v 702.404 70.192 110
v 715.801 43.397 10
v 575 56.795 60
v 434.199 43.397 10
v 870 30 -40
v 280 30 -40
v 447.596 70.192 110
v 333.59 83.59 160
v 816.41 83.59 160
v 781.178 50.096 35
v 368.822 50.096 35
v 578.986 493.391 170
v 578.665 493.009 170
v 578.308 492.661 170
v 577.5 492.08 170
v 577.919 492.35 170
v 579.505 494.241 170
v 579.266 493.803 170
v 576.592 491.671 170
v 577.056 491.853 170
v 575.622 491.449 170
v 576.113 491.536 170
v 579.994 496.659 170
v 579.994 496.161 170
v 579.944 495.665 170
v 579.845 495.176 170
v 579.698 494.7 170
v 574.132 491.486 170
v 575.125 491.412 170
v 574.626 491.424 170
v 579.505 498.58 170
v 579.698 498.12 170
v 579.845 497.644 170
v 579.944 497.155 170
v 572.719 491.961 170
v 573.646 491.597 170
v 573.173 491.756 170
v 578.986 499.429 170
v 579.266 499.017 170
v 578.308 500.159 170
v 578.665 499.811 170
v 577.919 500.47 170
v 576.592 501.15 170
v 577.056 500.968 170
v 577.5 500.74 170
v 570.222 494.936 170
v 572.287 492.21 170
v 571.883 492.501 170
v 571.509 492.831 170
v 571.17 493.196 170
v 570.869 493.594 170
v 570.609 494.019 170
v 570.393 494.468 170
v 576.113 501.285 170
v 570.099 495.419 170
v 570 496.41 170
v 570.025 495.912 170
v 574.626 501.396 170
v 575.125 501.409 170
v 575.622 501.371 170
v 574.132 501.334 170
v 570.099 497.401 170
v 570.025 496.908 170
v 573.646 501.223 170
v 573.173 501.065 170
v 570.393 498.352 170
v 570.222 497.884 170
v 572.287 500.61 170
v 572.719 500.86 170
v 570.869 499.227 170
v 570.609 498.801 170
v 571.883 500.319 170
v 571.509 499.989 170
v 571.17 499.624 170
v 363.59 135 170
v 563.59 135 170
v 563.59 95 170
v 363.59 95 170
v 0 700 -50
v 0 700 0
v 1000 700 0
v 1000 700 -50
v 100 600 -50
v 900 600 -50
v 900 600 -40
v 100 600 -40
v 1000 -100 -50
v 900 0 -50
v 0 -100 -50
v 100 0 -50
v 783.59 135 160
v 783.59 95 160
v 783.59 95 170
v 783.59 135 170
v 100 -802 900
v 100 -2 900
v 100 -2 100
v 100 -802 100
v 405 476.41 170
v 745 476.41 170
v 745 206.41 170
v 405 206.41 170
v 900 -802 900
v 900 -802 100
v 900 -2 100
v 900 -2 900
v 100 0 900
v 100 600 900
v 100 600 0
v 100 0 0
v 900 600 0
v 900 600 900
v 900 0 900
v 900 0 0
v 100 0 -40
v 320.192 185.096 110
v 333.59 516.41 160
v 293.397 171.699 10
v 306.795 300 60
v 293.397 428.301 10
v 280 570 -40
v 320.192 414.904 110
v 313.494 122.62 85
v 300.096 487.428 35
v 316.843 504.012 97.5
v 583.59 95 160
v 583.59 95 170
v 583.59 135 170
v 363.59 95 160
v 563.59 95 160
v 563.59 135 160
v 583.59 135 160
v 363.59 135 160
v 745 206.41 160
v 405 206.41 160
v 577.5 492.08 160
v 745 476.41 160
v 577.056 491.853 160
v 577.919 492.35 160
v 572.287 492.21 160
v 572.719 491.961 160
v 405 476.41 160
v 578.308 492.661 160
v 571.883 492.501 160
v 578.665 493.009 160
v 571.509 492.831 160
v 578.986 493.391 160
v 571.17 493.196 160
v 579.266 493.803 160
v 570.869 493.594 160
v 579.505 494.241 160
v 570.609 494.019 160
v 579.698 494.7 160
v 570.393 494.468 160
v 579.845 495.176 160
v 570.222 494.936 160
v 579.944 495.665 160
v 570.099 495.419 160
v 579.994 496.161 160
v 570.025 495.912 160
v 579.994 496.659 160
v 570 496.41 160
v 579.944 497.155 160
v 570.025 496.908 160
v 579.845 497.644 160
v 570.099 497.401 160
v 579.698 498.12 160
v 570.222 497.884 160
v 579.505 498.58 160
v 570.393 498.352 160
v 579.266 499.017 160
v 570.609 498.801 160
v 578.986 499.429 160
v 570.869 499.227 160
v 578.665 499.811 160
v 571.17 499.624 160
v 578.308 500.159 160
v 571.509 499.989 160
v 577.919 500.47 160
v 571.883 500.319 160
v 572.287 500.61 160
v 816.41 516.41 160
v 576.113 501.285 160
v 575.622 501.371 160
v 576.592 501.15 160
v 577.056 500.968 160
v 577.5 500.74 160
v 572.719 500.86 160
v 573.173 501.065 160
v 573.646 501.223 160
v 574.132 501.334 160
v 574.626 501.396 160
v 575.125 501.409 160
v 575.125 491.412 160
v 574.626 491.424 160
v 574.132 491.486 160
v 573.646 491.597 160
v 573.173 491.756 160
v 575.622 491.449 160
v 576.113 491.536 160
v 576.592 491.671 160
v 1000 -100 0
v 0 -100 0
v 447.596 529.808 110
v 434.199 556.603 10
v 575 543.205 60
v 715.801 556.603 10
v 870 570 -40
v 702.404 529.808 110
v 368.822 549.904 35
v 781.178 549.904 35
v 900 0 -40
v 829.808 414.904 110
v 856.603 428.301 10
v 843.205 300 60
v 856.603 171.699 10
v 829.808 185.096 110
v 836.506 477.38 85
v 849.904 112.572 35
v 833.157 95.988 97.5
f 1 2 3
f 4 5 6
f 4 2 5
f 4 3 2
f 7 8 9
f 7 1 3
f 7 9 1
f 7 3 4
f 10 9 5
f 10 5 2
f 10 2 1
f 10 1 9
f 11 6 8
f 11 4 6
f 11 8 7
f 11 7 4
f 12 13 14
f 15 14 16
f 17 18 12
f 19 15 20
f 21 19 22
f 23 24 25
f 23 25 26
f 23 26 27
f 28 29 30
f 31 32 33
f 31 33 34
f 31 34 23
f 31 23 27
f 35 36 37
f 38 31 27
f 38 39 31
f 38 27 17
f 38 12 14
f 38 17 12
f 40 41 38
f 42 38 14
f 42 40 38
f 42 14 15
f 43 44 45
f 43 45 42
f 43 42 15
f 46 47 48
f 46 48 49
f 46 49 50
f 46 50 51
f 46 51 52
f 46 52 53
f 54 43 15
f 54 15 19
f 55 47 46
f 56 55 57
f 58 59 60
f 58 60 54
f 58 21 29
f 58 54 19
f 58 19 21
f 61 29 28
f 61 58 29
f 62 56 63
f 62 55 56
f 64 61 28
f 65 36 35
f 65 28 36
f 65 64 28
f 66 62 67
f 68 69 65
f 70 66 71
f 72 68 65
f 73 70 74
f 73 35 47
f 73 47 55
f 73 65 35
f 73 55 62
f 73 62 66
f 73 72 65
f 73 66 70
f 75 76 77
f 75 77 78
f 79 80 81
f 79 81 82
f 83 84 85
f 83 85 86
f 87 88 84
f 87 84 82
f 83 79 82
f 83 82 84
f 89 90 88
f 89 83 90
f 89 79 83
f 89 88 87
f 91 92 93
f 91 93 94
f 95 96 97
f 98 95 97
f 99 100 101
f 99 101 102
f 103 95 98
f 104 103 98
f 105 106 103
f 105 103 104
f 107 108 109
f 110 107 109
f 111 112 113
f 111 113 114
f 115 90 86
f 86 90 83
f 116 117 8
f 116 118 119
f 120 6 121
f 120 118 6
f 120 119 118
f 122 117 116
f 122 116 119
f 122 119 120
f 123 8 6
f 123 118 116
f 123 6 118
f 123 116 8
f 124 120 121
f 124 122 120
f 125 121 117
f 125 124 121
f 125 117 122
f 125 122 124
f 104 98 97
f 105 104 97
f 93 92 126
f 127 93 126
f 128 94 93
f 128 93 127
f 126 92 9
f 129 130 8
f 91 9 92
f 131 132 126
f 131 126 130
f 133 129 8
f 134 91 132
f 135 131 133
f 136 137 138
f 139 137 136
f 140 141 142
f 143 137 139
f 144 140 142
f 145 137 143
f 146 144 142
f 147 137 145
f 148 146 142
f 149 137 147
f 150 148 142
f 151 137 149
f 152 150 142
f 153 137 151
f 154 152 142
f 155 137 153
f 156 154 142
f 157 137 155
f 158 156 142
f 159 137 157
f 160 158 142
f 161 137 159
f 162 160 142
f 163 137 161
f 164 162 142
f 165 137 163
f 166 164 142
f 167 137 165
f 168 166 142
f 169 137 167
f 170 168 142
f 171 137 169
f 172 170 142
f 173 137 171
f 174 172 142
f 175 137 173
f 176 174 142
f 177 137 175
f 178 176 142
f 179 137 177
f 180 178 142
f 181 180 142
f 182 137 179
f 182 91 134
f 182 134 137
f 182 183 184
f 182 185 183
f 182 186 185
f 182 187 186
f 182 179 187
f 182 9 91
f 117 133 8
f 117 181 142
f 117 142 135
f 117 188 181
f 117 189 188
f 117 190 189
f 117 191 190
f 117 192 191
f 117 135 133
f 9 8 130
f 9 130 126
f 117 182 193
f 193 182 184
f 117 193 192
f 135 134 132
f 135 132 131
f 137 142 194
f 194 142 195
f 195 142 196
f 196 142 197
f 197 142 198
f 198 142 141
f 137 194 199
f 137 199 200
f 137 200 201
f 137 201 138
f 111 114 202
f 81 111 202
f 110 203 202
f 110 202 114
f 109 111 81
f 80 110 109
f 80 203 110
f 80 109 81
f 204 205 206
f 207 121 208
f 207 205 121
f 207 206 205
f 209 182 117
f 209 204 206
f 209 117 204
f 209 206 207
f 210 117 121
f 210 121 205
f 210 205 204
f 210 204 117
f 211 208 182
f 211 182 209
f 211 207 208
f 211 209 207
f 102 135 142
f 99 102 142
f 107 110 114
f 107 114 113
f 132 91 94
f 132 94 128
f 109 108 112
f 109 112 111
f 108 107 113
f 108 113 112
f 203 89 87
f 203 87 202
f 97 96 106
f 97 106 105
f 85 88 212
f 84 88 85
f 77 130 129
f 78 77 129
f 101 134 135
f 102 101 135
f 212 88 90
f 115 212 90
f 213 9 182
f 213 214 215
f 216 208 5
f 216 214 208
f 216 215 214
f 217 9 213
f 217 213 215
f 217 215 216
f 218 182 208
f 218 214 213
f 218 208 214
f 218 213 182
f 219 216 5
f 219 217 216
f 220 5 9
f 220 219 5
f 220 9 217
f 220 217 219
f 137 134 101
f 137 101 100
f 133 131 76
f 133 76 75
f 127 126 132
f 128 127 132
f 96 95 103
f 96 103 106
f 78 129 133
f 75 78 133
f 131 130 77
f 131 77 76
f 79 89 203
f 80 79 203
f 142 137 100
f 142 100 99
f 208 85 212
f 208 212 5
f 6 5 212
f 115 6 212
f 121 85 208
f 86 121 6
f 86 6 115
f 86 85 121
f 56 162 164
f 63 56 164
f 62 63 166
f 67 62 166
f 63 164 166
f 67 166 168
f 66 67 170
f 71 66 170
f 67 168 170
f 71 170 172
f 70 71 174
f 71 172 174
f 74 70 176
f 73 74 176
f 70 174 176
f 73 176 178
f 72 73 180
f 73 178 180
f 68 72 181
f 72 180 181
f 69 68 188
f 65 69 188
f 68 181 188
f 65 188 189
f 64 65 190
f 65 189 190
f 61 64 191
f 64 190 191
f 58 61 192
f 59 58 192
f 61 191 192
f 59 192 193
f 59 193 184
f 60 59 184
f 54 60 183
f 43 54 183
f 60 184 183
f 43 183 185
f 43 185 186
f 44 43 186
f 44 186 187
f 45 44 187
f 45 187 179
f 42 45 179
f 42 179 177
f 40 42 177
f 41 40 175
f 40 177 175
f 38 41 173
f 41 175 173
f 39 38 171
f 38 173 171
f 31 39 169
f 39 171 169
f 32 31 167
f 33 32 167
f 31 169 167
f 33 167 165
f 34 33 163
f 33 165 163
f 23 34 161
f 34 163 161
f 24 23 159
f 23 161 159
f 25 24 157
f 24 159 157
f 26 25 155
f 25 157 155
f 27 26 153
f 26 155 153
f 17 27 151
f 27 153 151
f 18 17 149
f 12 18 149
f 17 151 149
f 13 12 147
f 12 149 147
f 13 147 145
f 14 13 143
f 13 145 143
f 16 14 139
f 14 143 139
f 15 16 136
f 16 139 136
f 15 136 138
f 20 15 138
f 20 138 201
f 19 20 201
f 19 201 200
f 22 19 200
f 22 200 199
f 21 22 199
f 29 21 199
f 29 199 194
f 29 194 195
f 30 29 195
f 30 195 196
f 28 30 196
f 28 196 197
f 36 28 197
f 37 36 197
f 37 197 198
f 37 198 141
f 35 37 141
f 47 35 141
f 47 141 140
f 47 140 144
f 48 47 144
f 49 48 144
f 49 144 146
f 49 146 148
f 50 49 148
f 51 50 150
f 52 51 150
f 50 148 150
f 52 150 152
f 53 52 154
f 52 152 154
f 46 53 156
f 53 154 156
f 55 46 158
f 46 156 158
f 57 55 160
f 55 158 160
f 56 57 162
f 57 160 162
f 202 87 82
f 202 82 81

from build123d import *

# Parameters (mm, degrees)
BOSS_EXTRUDE1_DEPTH   = 1000
SKETCH2_W             = 800
SKETCH2_H             = 800
BOSS_EXTRUDE1_2_DEPTH = 1000
SKETCH3_W             = 322.973978715
SKETCH3_H             = 1016.522363687
SKETCH3_W_2           = 410.438471969
CUT_EXTRUDE1_DEPTH    = 2189
SKETCH4_W             = 800
SKETCH4_H             = 600
CUT_EXTRUDE2_DEPTH    = 10
SKETCH5_W             = 590
SKETCH5_H             = 540
CUT_EXTRUDE3_DEPTH    = 200
CUT_EXTRUDE3_TAPER    = 15
SKETCH6_R             = 5
SKETCH6_W             = 340
SKETCH6_H             = 270
SKETCH6_W_2           = 200
SKETCH6_H_2           = 40
CUT_EXTRUDE4_DEPTH    = 10


with BuildPart() as part:
    # Sketch2 → Boss-Extrude1 (new body)
    with BuildSketch(Plane(origin=(0, 0, 0), x_dir=(0, 0, -1), z_dir=(1, 0, 0))):
        Polygon((0, 600), (0, 700), (50, 700), (50, -100), (0, -100), (0, 0), (-900, 0), (-900, 600), align=None)
    extrude(amount=BOSS_EXTRUDE1_DEPTH)


with BuildPart() as body_2:
    # Sketch2 → Boss-Extrude1 2 (new body)
    with BuildSketch(Plane(origin=(0, 0, 0), x_dir=(0, 0, -1), z_dir=(1, 0, 0))):
        with Locations((-500, -402)):
            Rectangle(SKETCH2_W, SKETCH2_H)
    extrude(amount=BOSS_EXTRUDE1_2_DEPTH)


with BuildPart() as cut_extrude1_tool:
    # Sketch3 → Cut-Extrude1 (new body)
    with BuildSketch(Plane(origin=(0, 600, 0), x_dir=(1, 0, 0), z_dir=(0, 1, 0))):
        with Locations((-61.486989358, -508.261181844)):
            Rectangle(SKETCH3_W, SKETCH3_H)
        with Locations((1105.219235985, -508.261181844)):
            Rectangle(SKETCH3_W_2, SKETCH3_H)
    extrude(amount=-CUT_EXTRUDE1_DEPTH)


with BuildPart() as part_1:
    add(part.part)

    # Cut-Extrude1: cut by cut_extrude1_tool
    add(cut_extrude1_tool.part, mode=Mode.SUBTRACT)

    # Sketch4 → Cut-Extrude2 (cut)
    with BuildSketch(Plane(origin=(0, 0, -50), x_dir=(-1, 0, 0), z_dir=(0, 0, -1))):
        with Locations((-500, 300)):
            Rectangle(SKETCH4_W, SKETCH4_H)
    extrude(amount=-CUT_EXTRUDE2_DEPTH, mode=Mode.SUBTRACT)

    # Sketch5 → Cut-Extrude3 (cut)
    with BuildSketch(Plane(origin=(0, 0, -40), x_dir=(-1, 0, 0), z_dir=(0, 0, -1))):
        with Locations((-575, 300)):
            Rectangle(SKETCH5_W, SKETCH5_H)
    extrude(amount=-CUT_EXTRUDE3_DEPTH, taper=CUT_EXTRUDE3_TAPER, mode=Mode.SUBTRACT)

    # Sketch6 → Cut-Extrude4 (cut)
    with BuildSketch(Plane(origin=(0, 0, 160), x_dir=(-1, 0, 0), z_dir=(0, 0, -1))):
        with Locations((-575, 496.410161514)):
            Circle(SKETCH6_R)
        with Locations((-575, 341.410161514)):
            Rectangle(SKETCH6_W, SKETCH6_H)
        with Locations((-683.589838486, 115)):
            Rectangle(SKETCH6_W_2, SKETCH6_H_2)
        with Locations((-463.589838486, 115)):
            Rectangle(SKETCH6_W_2, SKETCH6_H_2)
    extrude(amount=-CUT_EXTRUDE4_DEPTH, mode=Mode.SUBTRACT)


with BuildPart() as body_2_1:
    add(body_2.part)

    # Cut-Extrude1: cut by cut_extrude1_tool
    add(cut_extrude1_tool.part, mode=Mode.SUBTRACT)


solid = Compound([part_1.part, body_2_1.part])
